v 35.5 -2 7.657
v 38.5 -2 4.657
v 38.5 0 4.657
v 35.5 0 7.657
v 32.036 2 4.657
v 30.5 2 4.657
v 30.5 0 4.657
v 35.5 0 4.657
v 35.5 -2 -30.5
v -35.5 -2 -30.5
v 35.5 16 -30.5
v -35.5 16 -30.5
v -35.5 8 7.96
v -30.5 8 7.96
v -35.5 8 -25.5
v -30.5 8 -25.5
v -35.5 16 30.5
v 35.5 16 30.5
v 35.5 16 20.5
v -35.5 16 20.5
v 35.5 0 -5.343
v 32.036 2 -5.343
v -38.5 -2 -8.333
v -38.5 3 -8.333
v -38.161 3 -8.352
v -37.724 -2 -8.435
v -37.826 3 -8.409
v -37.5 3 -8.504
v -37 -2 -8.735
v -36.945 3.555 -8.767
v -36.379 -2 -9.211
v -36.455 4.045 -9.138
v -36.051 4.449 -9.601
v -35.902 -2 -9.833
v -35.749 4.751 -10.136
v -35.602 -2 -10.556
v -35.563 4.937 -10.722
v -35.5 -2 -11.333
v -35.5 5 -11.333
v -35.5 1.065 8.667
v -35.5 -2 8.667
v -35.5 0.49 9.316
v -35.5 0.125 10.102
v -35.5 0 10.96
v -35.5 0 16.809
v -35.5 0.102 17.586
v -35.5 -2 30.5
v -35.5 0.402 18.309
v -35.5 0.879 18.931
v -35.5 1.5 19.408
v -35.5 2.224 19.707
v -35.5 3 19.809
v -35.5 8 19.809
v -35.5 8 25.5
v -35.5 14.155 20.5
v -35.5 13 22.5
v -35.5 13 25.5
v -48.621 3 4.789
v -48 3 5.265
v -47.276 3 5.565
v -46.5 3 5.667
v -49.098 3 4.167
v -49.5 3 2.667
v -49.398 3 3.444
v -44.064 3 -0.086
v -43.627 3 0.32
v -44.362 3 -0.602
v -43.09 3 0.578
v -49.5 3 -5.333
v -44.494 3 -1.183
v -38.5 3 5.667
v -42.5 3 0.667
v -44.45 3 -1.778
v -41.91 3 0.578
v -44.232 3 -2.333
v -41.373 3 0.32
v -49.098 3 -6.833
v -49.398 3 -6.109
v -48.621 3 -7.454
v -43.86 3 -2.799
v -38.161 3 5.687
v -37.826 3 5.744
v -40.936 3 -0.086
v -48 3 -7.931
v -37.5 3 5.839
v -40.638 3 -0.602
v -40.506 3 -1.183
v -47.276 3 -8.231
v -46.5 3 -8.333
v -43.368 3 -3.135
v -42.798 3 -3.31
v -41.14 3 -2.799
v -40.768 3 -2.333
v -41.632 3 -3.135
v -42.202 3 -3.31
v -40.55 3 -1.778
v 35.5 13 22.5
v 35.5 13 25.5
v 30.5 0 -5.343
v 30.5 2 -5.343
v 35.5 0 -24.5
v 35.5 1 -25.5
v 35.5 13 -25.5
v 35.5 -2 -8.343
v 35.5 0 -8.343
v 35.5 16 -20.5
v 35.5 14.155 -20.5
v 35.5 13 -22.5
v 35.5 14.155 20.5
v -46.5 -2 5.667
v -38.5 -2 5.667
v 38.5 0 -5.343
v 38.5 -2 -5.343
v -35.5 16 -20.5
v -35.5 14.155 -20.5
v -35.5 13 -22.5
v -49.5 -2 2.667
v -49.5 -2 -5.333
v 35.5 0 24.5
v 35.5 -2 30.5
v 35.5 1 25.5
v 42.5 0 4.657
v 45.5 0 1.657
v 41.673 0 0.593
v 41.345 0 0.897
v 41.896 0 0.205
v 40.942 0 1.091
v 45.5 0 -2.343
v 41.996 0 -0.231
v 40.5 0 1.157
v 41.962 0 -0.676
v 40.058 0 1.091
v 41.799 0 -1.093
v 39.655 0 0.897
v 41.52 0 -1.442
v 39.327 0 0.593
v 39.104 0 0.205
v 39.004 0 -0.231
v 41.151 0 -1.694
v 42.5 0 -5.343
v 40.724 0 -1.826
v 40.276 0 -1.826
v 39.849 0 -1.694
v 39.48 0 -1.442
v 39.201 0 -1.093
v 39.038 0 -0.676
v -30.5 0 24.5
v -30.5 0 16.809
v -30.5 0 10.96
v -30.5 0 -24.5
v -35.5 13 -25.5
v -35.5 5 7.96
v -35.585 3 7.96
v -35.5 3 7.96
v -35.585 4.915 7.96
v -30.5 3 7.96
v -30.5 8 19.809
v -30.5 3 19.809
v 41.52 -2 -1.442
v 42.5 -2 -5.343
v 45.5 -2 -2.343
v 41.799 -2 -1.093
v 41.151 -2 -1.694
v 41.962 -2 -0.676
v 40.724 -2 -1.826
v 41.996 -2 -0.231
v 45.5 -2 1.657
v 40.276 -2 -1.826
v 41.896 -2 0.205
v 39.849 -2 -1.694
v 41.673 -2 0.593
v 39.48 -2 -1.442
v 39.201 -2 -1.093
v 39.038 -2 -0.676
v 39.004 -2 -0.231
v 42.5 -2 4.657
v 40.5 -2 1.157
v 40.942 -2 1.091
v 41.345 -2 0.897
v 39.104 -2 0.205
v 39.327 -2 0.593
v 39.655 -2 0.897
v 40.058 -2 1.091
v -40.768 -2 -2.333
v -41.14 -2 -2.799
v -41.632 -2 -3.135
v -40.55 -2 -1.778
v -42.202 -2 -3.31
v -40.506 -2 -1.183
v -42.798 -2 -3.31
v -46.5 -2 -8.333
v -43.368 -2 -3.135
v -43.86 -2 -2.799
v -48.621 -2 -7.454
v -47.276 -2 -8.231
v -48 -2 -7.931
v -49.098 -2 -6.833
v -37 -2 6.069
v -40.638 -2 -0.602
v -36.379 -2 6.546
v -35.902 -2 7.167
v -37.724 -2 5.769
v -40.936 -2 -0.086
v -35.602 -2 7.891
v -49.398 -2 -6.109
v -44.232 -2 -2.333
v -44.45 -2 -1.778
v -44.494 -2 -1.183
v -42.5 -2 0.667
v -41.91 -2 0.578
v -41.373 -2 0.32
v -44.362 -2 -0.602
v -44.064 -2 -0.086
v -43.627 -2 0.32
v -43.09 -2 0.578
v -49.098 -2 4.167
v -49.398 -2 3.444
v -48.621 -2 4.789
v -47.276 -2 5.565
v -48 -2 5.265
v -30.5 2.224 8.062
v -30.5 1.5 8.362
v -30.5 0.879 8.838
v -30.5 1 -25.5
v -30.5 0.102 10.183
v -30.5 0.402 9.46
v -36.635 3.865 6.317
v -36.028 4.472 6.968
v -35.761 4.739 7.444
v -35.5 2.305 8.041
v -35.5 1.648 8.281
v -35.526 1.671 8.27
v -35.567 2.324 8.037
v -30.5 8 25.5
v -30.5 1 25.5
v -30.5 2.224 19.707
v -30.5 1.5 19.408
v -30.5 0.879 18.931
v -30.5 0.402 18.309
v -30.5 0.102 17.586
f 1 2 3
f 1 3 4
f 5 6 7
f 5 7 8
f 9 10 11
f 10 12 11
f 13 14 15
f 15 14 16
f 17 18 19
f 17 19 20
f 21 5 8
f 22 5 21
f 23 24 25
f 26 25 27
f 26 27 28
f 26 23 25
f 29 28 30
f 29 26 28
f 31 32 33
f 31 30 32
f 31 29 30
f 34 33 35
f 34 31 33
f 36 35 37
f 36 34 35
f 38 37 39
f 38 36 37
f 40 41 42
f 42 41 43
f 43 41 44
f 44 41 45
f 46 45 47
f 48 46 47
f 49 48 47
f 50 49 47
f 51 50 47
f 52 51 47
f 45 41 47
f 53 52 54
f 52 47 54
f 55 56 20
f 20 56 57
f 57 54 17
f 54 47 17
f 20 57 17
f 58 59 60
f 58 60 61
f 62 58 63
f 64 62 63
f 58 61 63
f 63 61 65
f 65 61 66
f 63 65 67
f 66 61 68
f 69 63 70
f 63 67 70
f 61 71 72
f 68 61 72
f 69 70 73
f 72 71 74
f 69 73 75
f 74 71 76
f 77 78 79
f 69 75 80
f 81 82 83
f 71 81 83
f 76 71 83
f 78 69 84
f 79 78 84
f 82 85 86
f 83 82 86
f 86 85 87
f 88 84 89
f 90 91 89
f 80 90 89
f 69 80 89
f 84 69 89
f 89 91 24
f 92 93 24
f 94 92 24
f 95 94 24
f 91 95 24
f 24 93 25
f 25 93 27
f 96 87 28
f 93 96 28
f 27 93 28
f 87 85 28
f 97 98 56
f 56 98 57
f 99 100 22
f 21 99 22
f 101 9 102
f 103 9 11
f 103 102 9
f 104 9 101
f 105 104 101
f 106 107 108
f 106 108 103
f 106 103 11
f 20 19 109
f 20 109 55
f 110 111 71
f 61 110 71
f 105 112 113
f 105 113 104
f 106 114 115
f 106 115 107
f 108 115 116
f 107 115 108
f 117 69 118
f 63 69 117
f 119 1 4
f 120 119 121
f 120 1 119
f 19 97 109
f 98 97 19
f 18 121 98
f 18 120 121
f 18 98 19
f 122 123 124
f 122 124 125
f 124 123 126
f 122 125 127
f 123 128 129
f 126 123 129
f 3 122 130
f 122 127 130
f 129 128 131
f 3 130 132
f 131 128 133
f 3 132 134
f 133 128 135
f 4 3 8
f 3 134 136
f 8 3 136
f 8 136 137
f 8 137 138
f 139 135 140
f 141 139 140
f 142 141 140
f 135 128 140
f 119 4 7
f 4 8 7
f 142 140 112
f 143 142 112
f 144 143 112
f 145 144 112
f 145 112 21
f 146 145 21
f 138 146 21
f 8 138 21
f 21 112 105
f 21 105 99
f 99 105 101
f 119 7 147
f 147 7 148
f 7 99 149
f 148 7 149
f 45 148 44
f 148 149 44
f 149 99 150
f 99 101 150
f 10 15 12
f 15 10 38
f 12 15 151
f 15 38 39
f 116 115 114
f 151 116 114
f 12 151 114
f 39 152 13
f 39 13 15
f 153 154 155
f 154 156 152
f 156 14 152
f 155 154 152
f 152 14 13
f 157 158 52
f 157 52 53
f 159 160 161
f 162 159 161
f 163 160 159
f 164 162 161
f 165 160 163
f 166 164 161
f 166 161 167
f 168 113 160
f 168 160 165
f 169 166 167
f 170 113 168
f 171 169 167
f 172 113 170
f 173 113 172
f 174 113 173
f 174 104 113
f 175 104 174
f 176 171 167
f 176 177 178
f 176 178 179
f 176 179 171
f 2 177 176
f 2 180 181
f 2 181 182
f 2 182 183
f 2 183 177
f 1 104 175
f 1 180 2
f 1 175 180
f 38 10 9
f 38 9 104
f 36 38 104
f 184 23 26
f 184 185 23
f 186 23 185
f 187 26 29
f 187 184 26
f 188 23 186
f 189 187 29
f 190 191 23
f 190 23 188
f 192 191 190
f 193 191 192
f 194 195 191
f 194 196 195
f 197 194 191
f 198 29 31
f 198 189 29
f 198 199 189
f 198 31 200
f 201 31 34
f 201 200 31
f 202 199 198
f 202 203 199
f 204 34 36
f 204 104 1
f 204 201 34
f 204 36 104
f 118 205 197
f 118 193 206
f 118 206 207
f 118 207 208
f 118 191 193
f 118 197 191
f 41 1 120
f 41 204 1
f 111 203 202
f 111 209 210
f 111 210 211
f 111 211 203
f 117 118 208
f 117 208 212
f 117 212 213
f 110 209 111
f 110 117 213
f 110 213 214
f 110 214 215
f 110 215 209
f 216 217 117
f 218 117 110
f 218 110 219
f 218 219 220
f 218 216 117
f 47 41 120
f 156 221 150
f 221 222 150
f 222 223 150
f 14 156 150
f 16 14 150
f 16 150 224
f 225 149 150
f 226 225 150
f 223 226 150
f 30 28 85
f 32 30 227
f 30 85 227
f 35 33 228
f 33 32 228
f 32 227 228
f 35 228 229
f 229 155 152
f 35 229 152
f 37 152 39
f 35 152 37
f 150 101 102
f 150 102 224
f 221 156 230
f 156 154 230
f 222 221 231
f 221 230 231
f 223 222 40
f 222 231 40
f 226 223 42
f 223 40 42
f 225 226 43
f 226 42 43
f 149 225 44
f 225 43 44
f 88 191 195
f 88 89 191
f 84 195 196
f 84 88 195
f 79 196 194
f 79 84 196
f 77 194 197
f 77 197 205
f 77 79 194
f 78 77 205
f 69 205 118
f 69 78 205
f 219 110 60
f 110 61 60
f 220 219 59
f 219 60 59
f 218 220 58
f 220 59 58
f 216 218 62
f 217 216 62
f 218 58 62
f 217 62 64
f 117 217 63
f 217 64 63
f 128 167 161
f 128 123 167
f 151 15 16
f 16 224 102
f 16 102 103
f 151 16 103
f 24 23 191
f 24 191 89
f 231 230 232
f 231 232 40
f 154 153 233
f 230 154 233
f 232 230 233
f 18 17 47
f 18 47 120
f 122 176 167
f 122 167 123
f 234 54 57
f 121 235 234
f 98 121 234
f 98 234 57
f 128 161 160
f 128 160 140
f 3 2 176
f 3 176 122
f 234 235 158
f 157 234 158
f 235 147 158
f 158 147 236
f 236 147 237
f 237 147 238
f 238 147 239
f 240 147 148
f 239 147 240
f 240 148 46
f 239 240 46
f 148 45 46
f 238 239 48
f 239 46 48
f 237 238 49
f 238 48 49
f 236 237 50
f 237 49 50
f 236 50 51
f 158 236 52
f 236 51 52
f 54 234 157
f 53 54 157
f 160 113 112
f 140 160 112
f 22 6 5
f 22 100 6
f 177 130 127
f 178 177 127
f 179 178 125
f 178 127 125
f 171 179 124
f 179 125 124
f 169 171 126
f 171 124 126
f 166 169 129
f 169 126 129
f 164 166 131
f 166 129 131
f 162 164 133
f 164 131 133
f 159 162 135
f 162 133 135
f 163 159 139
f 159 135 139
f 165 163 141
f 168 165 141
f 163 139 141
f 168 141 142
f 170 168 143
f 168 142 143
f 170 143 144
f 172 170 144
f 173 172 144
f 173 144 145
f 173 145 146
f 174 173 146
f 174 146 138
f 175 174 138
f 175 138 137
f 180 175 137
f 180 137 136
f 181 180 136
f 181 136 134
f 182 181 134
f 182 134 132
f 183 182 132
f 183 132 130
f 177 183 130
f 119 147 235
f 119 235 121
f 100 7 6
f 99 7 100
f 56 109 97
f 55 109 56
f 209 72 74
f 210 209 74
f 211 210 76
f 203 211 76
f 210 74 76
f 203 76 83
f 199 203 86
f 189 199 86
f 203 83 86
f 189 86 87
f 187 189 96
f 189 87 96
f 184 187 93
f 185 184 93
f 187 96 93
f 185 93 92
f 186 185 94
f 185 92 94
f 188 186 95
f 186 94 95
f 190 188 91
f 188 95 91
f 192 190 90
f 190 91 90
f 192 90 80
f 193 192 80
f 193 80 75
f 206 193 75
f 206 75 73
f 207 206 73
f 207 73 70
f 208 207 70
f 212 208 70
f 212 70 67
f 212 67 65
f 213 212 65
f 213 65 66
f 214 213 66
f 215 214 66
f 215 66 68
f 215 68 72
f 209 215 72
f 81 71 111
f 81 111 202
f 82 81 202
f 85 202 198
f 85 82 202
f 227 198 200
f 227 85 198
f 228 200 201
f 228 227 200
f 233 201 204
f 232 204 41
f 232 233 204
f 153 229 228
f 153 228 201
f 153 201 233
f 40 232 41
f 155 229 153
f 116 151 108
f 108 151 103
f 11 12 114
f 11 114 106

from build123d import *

# Parameters (mm, degrees)
SKETCH1_W           = 71
SKETCH1_H           = 61
SKETCH1_W_2         = 61
SKETCH1_H_2         = 51
BOSS_EXTRUDE1_DEPTH = 16
SKETCH2_W           = 71
SKETCH2_H           = 61
BOSS_EXTRUDE2_DEPTH = 2
SKETCH3_W           = 11.849749017
SKETCH3_H           = 16
CUT_EXTRUDE1_DEPTH  = 12
FILLET1_R           = 3
SKETCH4_W           = 15
SKETCH4_H           = 16
CUT_EXTRUDE2_DEPTH  = 12
SKETCH5_W           = 21
SKETCH5_H           = 8
CUT_EXTRUDE3_DEPTH  = 12
SKETCH6_W           = 51
SKETCH6_H           = 8
CUT_EXTRUDE4_DEPTH  = 12
CHAMFER1_SIZE       = 1
SKETCH8_W           = 21
SKETCH8_H           = 8
CUT_EXTRUDE5_DEPTH  = 14
SKETCH9_W           = 71
SKETCH9_H           = 3
BOSS_EXTRUDE4_DEPTH = 5
CHAMFER3_SIZE       = 2
CHAMFER3_SIZE2      = 1.154700538
SKETCH10_W          = 71
SKETCH10_H          = 3
BOSS_EXTRUDE5_DEPTH = 5
CHAMFER4_SIZE       = 2
CHAMFER4_SIZE2      = 1.154700538
SKETCH11_W          = 5
SKETCH11_H          = 10
BOSS_EXTRUDE6_DEPTH = 2
CHAMFER5_SIZE       = 2
CHAMFER5_SIZE2      = 3.464101615
SKETCH12_W          = 14
SKETCH12_H          = 5
BOSS_EXTRUDE7_DEPTH = 14
CHAMFER6_SIZE       = 2
SKETCH13_R          = 2
CUT_EXTRUDE6_DEPTH  = 14
FILLET2_R           = 3
SKETCH14_W          = 10
SKETCH14_H          = 2
BOSS_EXTRUDE8_DEPTH = 10
SKETCH15_R          = 1.5
CUT_EXTRUDE7_DEPTH  = 10
CHAMFER7_SIZE       = 3
CHAMFER8_SIZE       = 3
FILLET3_R           = 3


with BuildPart() as part:
    # Sketch1 → Boss-Extrude1 (new body)
    with BuildSketch(Plane(origin=(0, 0, 0), x_dir=(1, 0, 0), z_dir=(0, 1, 0))):
        Rectangle(SKETCH1_W, SKETCH1_H)
        Rectangle(SKETCH1_W_2, SKETCH1_H_2, mode=Mode.SUBTRACT)
    extrude(amount=BOSS_EXTRUDE1_DEPTH)

    # Sketch2 → Boss-Extrude2 (add)
    with BuildSketch(Plane.XZ):
        Rectangle(SKETCH2_W, SKETCH2_H)
    extrude(amount=BOSS_EXTRUDE2_DEPTH)

    # Sketch3 → Cut-Extrude1 (cut)
    with BuildSketch(Plane(origin=(-30.5, 0, 0), x_dir=(0, 0, -1), z_dir=(1, 0, 0))):
        with Locations((-13.884589143, 8)):
            Rectangle(SKETCH3_W, SKETCH3_H)
    extrude(amount=-CUT_EXTRUDE1_DEPTH, mode=Mode.SUBTRACT)

    # Fillet1
    fillet1_edges = [part.edges().sort_by_distance(p)[0] for p in [
        (-33, 0, 19.809463651),
        (-33, 0, 7.959714634),
    ]]
    fillet(fillet1_edges, radius=FILLET1_R)

    # Sketch4 → Cut-Extrude2 (cut)
    with BuildSketch(Plane.ZY.offset(-30.5)):
        with Locations((-18, 8)):
            Rectangle(SKETCH4_W, SKETCH4_H)
        with Locations((18, 8)):
            Rectangle(SKETCH4_W, SKETCH4_H)
    extrude(amount=-CUT_EXTRUDE2_DEPTH, mode=Mode.SUBTRACT)

    # Sketch5 → Cut-Extrude3 (cut)
    with BuildSketch(Plane.ZY.offset(-30.5)):
        with Locations((0, 12)):
            Rectangle(SKETCH5_W, SKETCH5_H)
    extrude(amount=-CUT_EXTRUDE3_DEPTH, mode=Mode.SUBTRACT)

    # Sketch6 → Cut-Extrude4 (cut)
    with BuildSketch(Plane(origin=(-30.5, 0, 0), x_dir=(0, 0, -1), z_dir=(1, 0, 0))):
        with Locations((0, 12)):
            Rectangle(SKETCH6_W, SKETCH6_H)
    extrude(amount=-CUT_EXTRUDE4_DEPTH, mode=Mode.SUBTRACT)

    # Chamfer1
    chamfer1_edges = [part.edges().sort_by_distance(p)[0] for p in [
        (2.5, 0, -25.5),
        (2.5, 0, 25.5),
    ]]
    chamfer(chamfer1_edges, length=CHAMFER1_SIZE)

    # Sketch8 → Cut-Extrude5 (cut)
    with BuildSketch(Plane.ZY.offset(-30.5)):
        with Locations((0, 4)):
            Rectangle(SKETCH8_W, SKETCH8_H)
    extrude(amount=-CUT_EXTRUDE5_DEPTH, mode=Mode.SUBTRACT)

    # Sketch9 → Boss-Extrude4 (add)
    with BuildSketch(Plane.XY.offset(-25.5)):
        with Locations((0, 14.5)):
            Rectangle(SKETCH9_W, SKETCH9_H)
    extrude(amount=BOSS_EXTRUDE4_DEPTH)

    # Chamfer3
    chamfer3_edges = [part.edges().sort_by_distance(p)[0] for p in [
        (0, 13, -20.5),
    ]]
    chamfer3_side = [part.faces().sort_by_distance(p)[0] for p in [
        (0, 13, -23),
    ]]
    chamfer(chamfer3_edges, length=CHAMFER3_SIZE, length2=CHAMFER3_SIZE2, reference=chamfer3_side[0])

    # Sketch10 → Boss-Extrude5 (add)
    with BuildSketch(Plane(origin=(0, 0, 25.5), x_dir=(-1, 0, 0), z_dir=(0, 0, -1))):
        with Locations((0, 14.5)):
            Rectangle(SKETCH10_W, SKETCH10_H)
    extrude(amount=BOSS_EXTRUDE5_DEPTH)

    # Chamfer4
    chamfer4_edges = [part.edges().sort_by_distance(p)[0] for p in [
        (0, 13, 20.5),
    ]]
    chamfer4_side = [part.faces().sort_by_distance(p)[0] for p in [
        (0, 13, 23),
    ]]
    chamfer(chamfer4_edges, length=CHAMFER4_SIZE, length2=CHAMFER4_SIZE2, reference=chamfer4_side[0])

    # Sketch11 → Boss-Extrude6 (add)
    with BuildSketch(Plane(origin=(0, 0, 0), x_dir=(1, 0, 0), z_dir=(0, 1, 0))):
        with Locations((33, 0.342687242)):
            Rectangle(SKETCH11_W, SKETCH11_H)
    extrude(amount=BOSS_EXTRUDE6_DEPTH)

    # Chamfer5
    chamfer5_edges = [part.edges().sort_by_distance(p)[0] for p in [
        (35.5, 2, -0.342687242),
    ]]
    chamfer5_side = [part.faces().sort_by_distance(p)[0] for p in [
        (35.5, 15.077350269, 21.136003145),
    ]]
    chamfer(chamfer5_edges, length=CHAMFER5_SIZE, length2=CHAMFER5_SIZE2, reference=chamfer5_side[0])

    # Sketch12 → Boss-Extrude7 (add)
    with BuildSketch(Plane.ZY.offset(35.5)):
        with Locations((-1.332725664, 0.5)):
            Rectangle(SKETCH12_W, SKETCH12_H)
    extrude(amount=BOSS_EXTRUDE7_DEPTH)

    # Chamfer6
    chamfer6_edges = [part.edges().sort_by_distance(p)[0] for p in [
        (-35.5, 3, -1.332725664),
    ]]
    chamfer(chamfer6_edges, length=CHAMFER6_SIZE)

    # Sketch13 → Cut-Extrude6 (cut)
    with BuildSketch(Plane(origin=(0, 3, 0), x_dir=(1, 0, 0), z_dir=(0, 1, 0))):
        with Locations(Location((-42.5, 1.332725664, 0), (0, 0, 270))):
            Circle(SKETCH13_R)
    extrude(amount=-CUT_EXTRUDE6_DEPTH, mode=Mode.SUBTRACT)

    # Fillet2
    fillet2_edges = [part.edges().sort_by_distance(p)[0] for p in [
        (-49.5, 0.5, -8.332725664),
        (-49.5, 0.5, 5.667274336),
    ]]
    fillet(fillet2_edges, radius=FILLET2_R)

    # Sketch14 → Boss-Extrude8 (add)
    with BuildSketch(Plane(origin=(35.5, 0, 0), x_dir=(0, 0, -1), z_dir=(1, 0, 0))):
        with Locations((0.342687242, -1)):
            Rectangle(SKETCH14_W, SKETCH14_H)
    extrude(amount=BOSS_EXTRUDE8_DEPTH)

    # Sketch15 → Cut-Extrude7 (cut)
    with BuildSketch(Plane(origin=(0, 0, 0), x_dir=(1, 0, 0), z_dir=(0, 1, 0))):
        with Locations(Location((40.5, 0.342687242, 0), (0, 0, 270))):
            Circle(SKETCH15_R)
    extrude(amount=-CUT_EXTRUDE7_DEPTH, mode=Mode.SUBTRACT)

    # Chamfer7
    chamfer7_edges = [part.edges().sort_by_distance(p)[0] for p in [
        (45.5, -1, 4.657312758),
        (45.5, -1, -5.342687242),
    ]]
    chamfer(chamfer7_edges, length=CHAMFER7_SIZE)

    # Chamfer8
    # the kernel refuses this chamfer: 3 mm, written as the material it adds along each edge
    with BuildSketch(Plane(origin=(35.5, -2, 4.657312758), x_dir=(0.9996219169112968, 0, -0.02749587661058648), z_dir=(0, 1, 0)), Plane(origin=(35.5, 0, -5.342687242), x_dir=(0.9996219169112968, 0, 0.02749587661058648), z_dir=(0, -1, 0))) as chamfer8_piece_1:
        Polygon((CHAMFER8_SIZE * 0.999621916911, -CHAMFER8_SIZE * 0.0274958766106), (-CHAMFER8_SIZE * 0.0274958766106, -CHAMFER8_SIZE * 0.999621916911), (0, 0), align=None)
    extrude(amount=2)

    # Fillet3
    # the kernel refuses this fillet: 3 mm, written as the material it adds along each edge
    with BuildSketch(Plane(origin=(-35.5, 12.5, 5.667274336), x_dir=(0, 0, 1), z_dir=(0, -1, 0))) as fillet3_piece_1_section:
        with BuildLine():
            CenterArc((FILLET3_R, FILLET3_R), FILLET3_R, 180, 90)
            Line((0, FILLET3_R), (0, 0))
            Line((0, 0), (FILLET3_R, 0))
        make_face()
    fillet3_piece_1 = extrude(amount=14.5, mode=Mode.PRIVATE)
    fillet3_piece_1 = split(fillet3_piece_1, bisect_by=Plane(origin=(-37.935900015, 2.564099985, 5.657679593), z_dir=(-0.7071067811865477, 0.7071067811865475, 0)), keep=Keep.TOP, mode=Mode.PRIVATE)
    fillet3_piece_1 = split(fillet3_piece_1, bisect_by=Plane(origin=(-38.08120002, 3, 5.657679593), z_dir=(0, -1, 0)), keep=Keep.TOP, mode=Mode.PRIVATE)
    add(fillet3_piece_1)
    with BuildSketch(Plane(origin=(-35.5, 12.5, 5.667274336), x_dir=(0, 0, 1), z_dir=(0, -1, 0))) as fillet3_piece_2_section:
        with BuildLine():
            CenterArc((FILLET3_R, FILLET3_R), FILLET3_R, 180, 90)
            Line((0, FILLET3_R), (0, 0))
            Line((0, 0), (FILLET3_R, 0))
        make_face()
    fillet3_piece_2 = extrude(amount=14.5, mode=Mode.PRIVATE)
    fillet3_piece_2 = split(fillet3_piece_2, bisect_by=Plane(origin=(-36.308682262, 4.191317738, 6.44717053), z_dir=(0.7071067811865477, -0.7071067811865475, 0)), keep=Keep.TOP, mode=Mode.PRIVATE)
    fillet3_piece_2 = split(fillet3_piece_2, bisect_by=Plane(origin=(-35.911576349, 3.794211825, 7.959714634), z_dir=(0, 0, -1)), keep=Keep.TOP, mode=Mode.PRIVATE)
    fillet3_piece_2 = split(fillet3_piece_2, bisect_by=Plane(origin=(-35.911576349, 3, 6.44717053), z_dir=(0, 1, 0)), keep=Keep.TOP, mode=Mode.PRIVATE)
    add(fillet3_piece_2)
    with BuildSketch(Plane(origin=(-35.5, 12.5, 5.667274336), x_dir=(0, 0, 1), z_dir=(0, -1, 0))) as fillet3_piece_3_section:
        with BuildLine():
            CenterArc((FILLET3_R, FILLET3_R), FILLET3_R, 180, 90)
            Line((0, FILLET3_R), (0, 0))
            Line((0, 0), (FILLET3_R, 0))
        make_face()
    fillet3_piece_3 = extrude(amount=14.5, mode=Mode.PRIVATE)
    fillet3_piece_3 = split(fillet3_piece_3, bisect_by=Plane(origin=(-38.099888212, 2.400111788, 6.295666552), z_dir=(0.7071067811865477, -0.7071067811865475, 0)), keep=Keep.TOP, mode=Mode.PRIVATE)
    fillet3_piece_3 = split(fillet3_piece_3, bisect_by=Plane(origin=(-36.191024286, 0.491247862, 7.959714634), z_dir=(0, 0, -1)), keep=Keep.TOP, mode=Mode.PRIVATE)
    fillet3_piece_3 = split(fillet3_piece_3, bisect_by=Plane(origin=(-36.191024286, 3, 6.295666552), z_dir=(0, -1, 0)), keep=Keep.TOP, mode=Mode.PRIVATE)
    add(fillet3_piece_3)
    with BuildSketch(Plane(origin=(-35.5, 12.5, 5.667274336), x_dir=(0, 0, 1), z_dir=(0, -1, 0))) as fillet3_piece_4_section:
        with BuildLine():
            CenterArc((FILLET3_R, FILLET3_R), FILLET3_R, 180, 90)
            Line((0, FILLET3_R), (0, 0))
            Line((0, 0), (FILLET3_R, 0))
        make_face()
    fillet3_piece_4 = extrude(amount=14.5, mode=Mode.PRIVATE)
    fillet3_piece_4 = split(fillet3_piece_4, bisect_by=Plane(origin=(-35.48926289, -0.06844391, 7.959714634), z_dir=(0, 0, 1)), keep=Keep.TOP, mode=Mode.PRIVATE)
    fillet3_piece_4 = fillet3_piece_4 - Plane(origin=(-35.48926289, 3, 10.959714634), x_dir=(0, -1, 0), z_dir=(-1, 0, 0)) * Cylinder(3, 41, mode=Mode.PRIVATE)
    fillet3_piece_4 = split(fillet3_piece_4, bisect_by=Plane(origin=(-35.48926289, 3, 8.232443119), z_dir=(0, -1, 0)), keep=Keep.TOP, mode=Mode.PRIVATE)
    add(fillet3_piece_4)
    with BuildSketch(Plane(origin=(-35.5, -2, -8.332725664), x_dir=(0, 0, -1), z_dir=(0, 1, 0))) as fillet3_piece_5_section:
        with BuildLine():
            CenterArc((FILLET3_R, FILLET3_R), FILLET3_R, 180, 90)
            Line((0, FILLET3_R), (0, 0))
            Line((0, 0), (FILLET3_R, 0))
        make_face()
    fillet3_piece_5 = extrude(amount=14.5, mode=Mode.PRIVATE)
    fillet3_piece_5 = split(fillet3_piece_5, bisect_by=Plane(origin=(-38.090184906, 2.409815094, -9.014565132), z_dir=(0.7071067811865477, -0.7071067811865475, 0)), keep=Keep.TOP, mode=Mode.PRIVATE)
    fillet3_piece_5 = split(fillet3_piece_5, bisect_by=Plane(origin=(-36.171856175, 3, -9.014565132), z_dir=(0, -1, 0)), keep=Keep.TOP, mode=Mode.PRIVATE)
    add(fillet3_piece_5)
    with BuildSketch(Plane(origin=(-35.5, -2, -8.332725664), x_dir=(0, 0, -1), z_dir=(0, 1, 0))) as fillet3_piece_6_section:
        with BuildLine():
            CenterArc((FILLET3_R, FILLET3_R), FILLET3_R, 180, 90)
            Line((0, FILLET3_R), (0, 0))
            Line((0, 0), (FILLET3_R, 0))
        make_face()
    fillet3_piece_6 = extrude(amount=14.5, mode=Mode.PRIVATE)
    fillet3_piece_6 = split(fillet3_piece_6, bisect_by=Plane(origin=(-37.935900015, 2.564099985, -8.32313092), z_dir=(-0.7071067811865477, 0.7071067811865475, 0)), keep=Keep.TOP, mode=Mode.PRIVATE)
    fillet3_piece_6 = split(fillet3_piece_6, bisect_by=Plane(origin=(-38.08120002, 3, -8.32313092), z_dir=(0, -1, 0)), keep=Keep.TOP, mode=Mode.PRIVATE)
    add(fillet3_piece_6)
    with BuildSketch(Plane(origin=(-35.5, -2, -8.332725664), x_dir=(0, 0, -1), z_dir=(0, 1, 0))) as fillet3_piece_7_section:
        with BuildLine():
            CenterArc((FILLET3_R, FILLET3_R), FILLET3_R, 180, 90)
            Line((0, FILLET3_R), (0, 0))
            Line((0, 0), (FILLET3_R, 0))
        make_face()
    fillet3_piece_7 = extrude(amount=14.5, mode=Mode.PRIVATE)
    fillet3_piece_7 = split(fillet3_piece_7, bisect_by=Plane(origin=(-36.295704825, 4.204295175, -9.186455327), z_dir=(0.7071067811865477, -0.7071067811865475, 0)), keep=Keep.TOP, mode=Mode.PRIVATE)
    fillet3_piece_7 = split(fillet3_piece_7, bisect_by=Plane(origin=(-35.8942731, 3, -9.186455327), z_dir=(0, 1, 0)), keep=Keep.TOP, mode=Mode.PRIVATE)
    add(fillet3_piece_7)


solid = part.part
